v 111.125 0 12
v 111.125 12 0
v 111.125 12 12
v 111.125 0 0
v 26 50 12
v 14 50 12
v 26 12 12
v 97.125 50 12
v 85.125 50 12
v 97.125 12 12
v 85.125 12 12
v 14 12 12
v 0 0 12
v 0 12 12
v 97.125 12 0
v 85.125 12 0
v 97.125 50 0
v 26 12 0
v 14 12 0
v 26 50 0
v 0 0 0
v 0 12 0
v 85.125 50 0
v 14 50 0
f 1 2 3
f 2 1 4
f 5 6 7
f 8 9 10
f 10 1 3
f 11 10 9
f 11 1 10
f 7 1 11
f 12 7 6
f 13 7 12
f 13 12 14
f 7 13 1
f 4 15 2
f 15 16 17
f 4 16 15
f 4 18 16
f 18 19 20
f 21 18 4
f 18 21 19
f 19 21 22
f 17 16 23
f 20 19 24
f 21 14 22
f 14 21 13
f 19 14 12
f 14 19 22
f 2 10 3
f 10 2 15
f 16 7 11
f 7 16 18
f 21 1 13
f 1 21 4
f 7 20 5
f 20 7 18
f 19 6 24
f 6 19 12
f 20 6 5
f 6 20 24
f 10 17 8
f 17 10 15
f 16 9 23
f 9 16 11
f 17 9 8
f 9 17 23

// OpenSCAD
top_beam_width = 111.125;
top_beam_depth = 12;
top_beam_height = 12;

leg_beam_width = 12;
leg_beam_depth = 50;
leg_beam_height = 12;

left_offset = 20 - (leg_beam_width / 2);
right_offset = top_beam_width - (20 + (leg_beam_width / 2));


// Top Beam
// width,depth,height
cube(size = [top_beam_width, top_beam_depth, top_beam_height], center = false);

translate([left_offset,0,0]) 
    cube(size = [leg_beam_width, leg_beam_depth, leg_beam_height], center = false);

translate([right_offset,0,0]) 
    cube(size = [leg_beam_width, leg_beam_depth, leg_beam_height], center = false);
